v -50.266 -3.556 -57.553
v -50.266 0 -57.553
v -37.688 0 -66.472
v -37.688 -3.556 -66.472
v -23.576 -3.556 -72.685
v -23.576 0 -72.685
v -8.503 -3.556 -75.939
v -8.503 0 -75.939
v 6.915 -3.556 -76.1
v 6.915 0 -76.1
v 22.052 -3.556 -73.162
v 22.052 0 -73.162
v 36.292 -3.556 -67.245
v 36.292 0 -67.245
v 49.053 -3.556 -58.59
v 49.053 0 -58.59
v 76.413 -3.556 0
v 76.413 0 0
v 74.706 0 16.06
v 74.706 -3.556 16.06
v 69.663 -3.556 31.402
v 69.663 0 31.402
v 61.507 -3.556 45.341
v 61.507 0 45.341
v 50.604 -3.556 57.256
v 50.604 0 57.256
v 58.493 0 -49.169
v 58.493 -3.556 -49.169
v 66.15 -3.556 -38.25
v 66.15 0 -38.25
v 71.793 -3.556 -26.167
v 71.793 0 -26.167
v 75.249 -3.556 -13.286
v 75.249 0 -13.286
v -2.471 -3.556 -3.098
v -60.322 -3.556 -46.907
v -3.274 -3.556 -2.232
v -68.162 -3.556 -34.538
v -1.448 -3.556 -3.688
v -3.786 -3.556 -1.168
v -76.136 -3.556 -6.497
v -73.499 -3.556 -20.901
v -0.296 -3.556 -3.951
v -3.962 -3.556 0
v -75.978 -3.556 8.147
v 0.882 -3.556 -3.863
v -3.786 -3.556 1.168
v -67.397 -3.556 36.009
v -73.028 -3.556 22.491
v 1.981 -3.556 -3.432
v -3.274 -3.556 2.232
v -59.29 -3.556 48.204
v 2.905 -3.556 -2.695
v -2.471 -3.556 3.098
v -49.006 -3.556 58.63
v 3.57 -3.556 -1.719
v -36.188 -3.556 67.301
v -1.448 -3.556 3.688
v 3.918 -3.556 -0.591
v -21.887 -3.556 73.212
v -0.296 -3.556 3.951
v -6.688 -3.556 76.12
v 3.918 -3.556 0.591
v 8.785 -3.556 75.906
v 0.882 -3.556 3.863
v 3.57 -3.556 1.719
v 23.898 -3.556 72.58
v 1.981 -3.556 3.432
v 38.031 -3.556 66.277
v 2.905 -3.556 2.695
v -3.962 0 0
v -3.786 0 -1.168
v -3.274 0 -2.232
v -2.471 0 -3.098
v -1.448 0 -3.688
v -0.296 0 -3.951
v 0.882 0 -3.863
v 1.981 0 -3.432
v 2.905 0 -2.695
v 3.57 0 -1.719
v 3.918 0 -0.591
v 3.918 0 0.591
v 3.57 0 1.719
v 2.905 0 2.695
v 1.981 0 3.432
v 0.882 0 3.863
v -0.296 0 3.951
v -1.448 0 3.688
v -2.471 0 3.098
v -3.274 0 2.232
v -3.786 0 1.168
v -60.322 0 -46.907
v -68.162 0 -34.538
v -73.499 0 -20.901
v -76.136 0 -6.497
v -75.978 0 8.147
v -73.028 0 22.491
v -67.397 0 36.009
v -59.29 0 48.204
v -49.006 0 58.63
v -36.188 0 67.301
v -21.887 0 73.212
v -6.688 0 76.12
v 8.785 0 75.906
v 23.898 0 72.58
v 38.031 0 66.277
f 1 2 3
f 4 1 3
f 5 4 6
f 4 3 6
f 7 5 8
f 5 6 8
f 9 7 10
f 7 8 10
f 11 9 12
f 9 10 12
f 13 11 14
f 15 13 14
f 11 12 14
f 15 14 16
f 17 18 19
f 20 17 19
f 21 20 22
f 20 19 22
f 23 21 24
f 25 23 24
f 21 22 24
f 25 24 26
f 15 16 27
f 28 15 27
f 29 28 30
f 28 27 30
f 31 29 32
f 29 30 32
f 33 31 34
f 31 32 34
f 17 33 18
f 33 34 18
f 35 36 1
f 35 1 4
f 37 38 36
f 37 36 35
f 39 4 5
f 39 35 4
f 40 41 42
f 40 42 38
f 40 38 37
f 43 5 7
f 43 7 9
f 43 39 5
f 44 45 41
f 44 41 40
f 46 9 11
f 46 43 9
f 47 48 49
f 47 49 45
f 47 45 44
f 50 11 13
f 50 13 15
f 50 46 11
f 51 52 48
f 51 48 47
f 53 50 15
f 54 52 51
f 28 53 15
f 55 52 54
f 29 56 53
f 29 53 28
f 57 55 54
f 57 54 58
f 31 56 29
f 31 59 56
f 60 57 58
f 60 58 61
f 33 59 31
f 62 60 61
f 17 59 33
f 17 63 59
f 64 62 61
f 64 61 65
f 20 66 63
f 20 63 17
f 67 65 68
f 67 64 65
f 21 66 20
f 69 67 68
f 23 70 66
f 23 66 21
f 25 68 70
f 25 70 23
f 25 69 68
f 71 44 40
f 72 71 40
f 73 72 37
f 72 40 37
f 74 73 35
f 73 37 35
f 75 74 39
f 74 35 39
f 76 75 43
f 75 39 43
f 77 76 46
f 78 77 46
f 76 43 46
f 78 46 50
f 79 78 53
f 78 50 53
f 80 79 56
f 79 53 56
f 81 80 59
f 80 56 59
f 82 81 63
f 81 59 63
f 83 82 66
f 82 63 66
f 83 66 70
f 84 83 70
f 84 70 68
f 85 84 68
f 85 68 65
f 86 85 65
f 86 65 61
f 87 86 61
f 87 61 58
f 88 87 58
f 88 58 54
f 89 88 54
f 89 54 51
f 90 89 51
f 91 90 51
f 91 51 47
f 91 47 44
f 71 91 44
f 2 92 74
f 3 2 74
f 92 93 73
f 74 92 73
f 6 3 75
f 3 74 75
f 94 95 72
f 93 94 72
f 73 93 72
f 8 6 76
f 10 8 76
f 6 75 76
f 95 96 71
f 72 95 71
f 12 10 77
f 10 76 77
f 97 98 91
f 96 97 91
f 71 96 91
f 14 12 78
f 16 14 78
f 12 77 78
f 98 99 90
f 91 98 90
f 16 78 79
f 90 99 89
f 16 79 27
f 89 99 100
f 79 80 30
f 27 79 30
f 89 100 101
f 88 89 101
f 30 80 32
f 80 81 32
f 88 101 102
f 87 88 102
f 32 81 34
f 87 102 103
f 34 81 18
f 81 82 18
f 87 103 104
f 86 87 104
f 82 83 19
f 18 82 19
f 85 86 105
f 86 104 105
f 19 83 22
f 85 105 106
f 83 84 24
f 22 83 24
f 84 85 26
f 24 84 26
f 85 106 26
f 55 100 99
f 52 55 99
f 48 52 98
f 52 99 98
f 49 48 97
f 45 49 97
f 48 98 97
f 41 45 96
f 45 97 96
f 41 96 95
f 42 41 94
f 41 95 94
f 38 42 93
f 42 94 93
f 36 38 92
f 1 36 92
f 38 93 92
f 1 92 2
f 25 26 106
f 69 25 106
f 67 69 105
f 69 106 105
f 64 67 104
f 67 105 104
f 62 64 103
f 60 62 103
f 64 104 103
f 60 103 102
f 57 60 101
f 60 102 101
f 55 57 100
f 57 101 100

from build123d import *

# Parameters (mm, degrees)
F1_DEPTH = 3.556
F2_D     = 7.9248


with BuildPart() as f1:
    # F0 (on Front) → F1 (new body)
    with BuildSketch(Plane.XZ):
        with BuildLine():
            ThreePointArc((49.052849, -58.590001), (69.236021, -32.331775), (76.413155, 0))
            ThreePointArc((76.413155, 0), (69.662719, 31.401845), (50.604095, 57.255531))
            Line((50.604095, 57.255531), (0.166721, -0.151271))
            Line((0.166721, -0.151271), (49.052849, -58.590001))
        make_face()
        with BuildLine():
            Line((0.166721, -0.151271), (50.604095, 57.255531))
            ThreePointArc((50.604095, 57.255531), (1.053942, 76.405886), (-49.005576, 58.629547))
            Line((-49.005576, 58.629547), (0.166721, -0.151271))
        make_face()
        with BuildLine():
            ThreePointArc((-50.265902, -57.552666), (-0.798054, -76.408988), (49.052849, -58.590001))
            Line((49.052849, -58.590001), (0.166721, -0.151271))
            Line((0.166721, -0.151271), (-50.265902, -57.552666))
        make_face()
        with BuildLine():
            Line((0.166721, -0.151271), (-49.005576, 58.629547))
            ThreePointArc((-49.005576, 58.629547), (-76.40866, 0.828868), (-50.265902, -57.552666))
            Line((-50.265902, -57.552666), (0.166721, -0.151271))
        make_face()
    extrude(amount=F1_DEPTH)

    # F2 (through all)
    with Locations(Plane(origin=(0, 0, 0), x_dir=(1, 0, 0), z_dir=(0, 1, 0))):
        with Locations((0, 0)):
            Hole(F2_D / 2)


solid = f1.part
